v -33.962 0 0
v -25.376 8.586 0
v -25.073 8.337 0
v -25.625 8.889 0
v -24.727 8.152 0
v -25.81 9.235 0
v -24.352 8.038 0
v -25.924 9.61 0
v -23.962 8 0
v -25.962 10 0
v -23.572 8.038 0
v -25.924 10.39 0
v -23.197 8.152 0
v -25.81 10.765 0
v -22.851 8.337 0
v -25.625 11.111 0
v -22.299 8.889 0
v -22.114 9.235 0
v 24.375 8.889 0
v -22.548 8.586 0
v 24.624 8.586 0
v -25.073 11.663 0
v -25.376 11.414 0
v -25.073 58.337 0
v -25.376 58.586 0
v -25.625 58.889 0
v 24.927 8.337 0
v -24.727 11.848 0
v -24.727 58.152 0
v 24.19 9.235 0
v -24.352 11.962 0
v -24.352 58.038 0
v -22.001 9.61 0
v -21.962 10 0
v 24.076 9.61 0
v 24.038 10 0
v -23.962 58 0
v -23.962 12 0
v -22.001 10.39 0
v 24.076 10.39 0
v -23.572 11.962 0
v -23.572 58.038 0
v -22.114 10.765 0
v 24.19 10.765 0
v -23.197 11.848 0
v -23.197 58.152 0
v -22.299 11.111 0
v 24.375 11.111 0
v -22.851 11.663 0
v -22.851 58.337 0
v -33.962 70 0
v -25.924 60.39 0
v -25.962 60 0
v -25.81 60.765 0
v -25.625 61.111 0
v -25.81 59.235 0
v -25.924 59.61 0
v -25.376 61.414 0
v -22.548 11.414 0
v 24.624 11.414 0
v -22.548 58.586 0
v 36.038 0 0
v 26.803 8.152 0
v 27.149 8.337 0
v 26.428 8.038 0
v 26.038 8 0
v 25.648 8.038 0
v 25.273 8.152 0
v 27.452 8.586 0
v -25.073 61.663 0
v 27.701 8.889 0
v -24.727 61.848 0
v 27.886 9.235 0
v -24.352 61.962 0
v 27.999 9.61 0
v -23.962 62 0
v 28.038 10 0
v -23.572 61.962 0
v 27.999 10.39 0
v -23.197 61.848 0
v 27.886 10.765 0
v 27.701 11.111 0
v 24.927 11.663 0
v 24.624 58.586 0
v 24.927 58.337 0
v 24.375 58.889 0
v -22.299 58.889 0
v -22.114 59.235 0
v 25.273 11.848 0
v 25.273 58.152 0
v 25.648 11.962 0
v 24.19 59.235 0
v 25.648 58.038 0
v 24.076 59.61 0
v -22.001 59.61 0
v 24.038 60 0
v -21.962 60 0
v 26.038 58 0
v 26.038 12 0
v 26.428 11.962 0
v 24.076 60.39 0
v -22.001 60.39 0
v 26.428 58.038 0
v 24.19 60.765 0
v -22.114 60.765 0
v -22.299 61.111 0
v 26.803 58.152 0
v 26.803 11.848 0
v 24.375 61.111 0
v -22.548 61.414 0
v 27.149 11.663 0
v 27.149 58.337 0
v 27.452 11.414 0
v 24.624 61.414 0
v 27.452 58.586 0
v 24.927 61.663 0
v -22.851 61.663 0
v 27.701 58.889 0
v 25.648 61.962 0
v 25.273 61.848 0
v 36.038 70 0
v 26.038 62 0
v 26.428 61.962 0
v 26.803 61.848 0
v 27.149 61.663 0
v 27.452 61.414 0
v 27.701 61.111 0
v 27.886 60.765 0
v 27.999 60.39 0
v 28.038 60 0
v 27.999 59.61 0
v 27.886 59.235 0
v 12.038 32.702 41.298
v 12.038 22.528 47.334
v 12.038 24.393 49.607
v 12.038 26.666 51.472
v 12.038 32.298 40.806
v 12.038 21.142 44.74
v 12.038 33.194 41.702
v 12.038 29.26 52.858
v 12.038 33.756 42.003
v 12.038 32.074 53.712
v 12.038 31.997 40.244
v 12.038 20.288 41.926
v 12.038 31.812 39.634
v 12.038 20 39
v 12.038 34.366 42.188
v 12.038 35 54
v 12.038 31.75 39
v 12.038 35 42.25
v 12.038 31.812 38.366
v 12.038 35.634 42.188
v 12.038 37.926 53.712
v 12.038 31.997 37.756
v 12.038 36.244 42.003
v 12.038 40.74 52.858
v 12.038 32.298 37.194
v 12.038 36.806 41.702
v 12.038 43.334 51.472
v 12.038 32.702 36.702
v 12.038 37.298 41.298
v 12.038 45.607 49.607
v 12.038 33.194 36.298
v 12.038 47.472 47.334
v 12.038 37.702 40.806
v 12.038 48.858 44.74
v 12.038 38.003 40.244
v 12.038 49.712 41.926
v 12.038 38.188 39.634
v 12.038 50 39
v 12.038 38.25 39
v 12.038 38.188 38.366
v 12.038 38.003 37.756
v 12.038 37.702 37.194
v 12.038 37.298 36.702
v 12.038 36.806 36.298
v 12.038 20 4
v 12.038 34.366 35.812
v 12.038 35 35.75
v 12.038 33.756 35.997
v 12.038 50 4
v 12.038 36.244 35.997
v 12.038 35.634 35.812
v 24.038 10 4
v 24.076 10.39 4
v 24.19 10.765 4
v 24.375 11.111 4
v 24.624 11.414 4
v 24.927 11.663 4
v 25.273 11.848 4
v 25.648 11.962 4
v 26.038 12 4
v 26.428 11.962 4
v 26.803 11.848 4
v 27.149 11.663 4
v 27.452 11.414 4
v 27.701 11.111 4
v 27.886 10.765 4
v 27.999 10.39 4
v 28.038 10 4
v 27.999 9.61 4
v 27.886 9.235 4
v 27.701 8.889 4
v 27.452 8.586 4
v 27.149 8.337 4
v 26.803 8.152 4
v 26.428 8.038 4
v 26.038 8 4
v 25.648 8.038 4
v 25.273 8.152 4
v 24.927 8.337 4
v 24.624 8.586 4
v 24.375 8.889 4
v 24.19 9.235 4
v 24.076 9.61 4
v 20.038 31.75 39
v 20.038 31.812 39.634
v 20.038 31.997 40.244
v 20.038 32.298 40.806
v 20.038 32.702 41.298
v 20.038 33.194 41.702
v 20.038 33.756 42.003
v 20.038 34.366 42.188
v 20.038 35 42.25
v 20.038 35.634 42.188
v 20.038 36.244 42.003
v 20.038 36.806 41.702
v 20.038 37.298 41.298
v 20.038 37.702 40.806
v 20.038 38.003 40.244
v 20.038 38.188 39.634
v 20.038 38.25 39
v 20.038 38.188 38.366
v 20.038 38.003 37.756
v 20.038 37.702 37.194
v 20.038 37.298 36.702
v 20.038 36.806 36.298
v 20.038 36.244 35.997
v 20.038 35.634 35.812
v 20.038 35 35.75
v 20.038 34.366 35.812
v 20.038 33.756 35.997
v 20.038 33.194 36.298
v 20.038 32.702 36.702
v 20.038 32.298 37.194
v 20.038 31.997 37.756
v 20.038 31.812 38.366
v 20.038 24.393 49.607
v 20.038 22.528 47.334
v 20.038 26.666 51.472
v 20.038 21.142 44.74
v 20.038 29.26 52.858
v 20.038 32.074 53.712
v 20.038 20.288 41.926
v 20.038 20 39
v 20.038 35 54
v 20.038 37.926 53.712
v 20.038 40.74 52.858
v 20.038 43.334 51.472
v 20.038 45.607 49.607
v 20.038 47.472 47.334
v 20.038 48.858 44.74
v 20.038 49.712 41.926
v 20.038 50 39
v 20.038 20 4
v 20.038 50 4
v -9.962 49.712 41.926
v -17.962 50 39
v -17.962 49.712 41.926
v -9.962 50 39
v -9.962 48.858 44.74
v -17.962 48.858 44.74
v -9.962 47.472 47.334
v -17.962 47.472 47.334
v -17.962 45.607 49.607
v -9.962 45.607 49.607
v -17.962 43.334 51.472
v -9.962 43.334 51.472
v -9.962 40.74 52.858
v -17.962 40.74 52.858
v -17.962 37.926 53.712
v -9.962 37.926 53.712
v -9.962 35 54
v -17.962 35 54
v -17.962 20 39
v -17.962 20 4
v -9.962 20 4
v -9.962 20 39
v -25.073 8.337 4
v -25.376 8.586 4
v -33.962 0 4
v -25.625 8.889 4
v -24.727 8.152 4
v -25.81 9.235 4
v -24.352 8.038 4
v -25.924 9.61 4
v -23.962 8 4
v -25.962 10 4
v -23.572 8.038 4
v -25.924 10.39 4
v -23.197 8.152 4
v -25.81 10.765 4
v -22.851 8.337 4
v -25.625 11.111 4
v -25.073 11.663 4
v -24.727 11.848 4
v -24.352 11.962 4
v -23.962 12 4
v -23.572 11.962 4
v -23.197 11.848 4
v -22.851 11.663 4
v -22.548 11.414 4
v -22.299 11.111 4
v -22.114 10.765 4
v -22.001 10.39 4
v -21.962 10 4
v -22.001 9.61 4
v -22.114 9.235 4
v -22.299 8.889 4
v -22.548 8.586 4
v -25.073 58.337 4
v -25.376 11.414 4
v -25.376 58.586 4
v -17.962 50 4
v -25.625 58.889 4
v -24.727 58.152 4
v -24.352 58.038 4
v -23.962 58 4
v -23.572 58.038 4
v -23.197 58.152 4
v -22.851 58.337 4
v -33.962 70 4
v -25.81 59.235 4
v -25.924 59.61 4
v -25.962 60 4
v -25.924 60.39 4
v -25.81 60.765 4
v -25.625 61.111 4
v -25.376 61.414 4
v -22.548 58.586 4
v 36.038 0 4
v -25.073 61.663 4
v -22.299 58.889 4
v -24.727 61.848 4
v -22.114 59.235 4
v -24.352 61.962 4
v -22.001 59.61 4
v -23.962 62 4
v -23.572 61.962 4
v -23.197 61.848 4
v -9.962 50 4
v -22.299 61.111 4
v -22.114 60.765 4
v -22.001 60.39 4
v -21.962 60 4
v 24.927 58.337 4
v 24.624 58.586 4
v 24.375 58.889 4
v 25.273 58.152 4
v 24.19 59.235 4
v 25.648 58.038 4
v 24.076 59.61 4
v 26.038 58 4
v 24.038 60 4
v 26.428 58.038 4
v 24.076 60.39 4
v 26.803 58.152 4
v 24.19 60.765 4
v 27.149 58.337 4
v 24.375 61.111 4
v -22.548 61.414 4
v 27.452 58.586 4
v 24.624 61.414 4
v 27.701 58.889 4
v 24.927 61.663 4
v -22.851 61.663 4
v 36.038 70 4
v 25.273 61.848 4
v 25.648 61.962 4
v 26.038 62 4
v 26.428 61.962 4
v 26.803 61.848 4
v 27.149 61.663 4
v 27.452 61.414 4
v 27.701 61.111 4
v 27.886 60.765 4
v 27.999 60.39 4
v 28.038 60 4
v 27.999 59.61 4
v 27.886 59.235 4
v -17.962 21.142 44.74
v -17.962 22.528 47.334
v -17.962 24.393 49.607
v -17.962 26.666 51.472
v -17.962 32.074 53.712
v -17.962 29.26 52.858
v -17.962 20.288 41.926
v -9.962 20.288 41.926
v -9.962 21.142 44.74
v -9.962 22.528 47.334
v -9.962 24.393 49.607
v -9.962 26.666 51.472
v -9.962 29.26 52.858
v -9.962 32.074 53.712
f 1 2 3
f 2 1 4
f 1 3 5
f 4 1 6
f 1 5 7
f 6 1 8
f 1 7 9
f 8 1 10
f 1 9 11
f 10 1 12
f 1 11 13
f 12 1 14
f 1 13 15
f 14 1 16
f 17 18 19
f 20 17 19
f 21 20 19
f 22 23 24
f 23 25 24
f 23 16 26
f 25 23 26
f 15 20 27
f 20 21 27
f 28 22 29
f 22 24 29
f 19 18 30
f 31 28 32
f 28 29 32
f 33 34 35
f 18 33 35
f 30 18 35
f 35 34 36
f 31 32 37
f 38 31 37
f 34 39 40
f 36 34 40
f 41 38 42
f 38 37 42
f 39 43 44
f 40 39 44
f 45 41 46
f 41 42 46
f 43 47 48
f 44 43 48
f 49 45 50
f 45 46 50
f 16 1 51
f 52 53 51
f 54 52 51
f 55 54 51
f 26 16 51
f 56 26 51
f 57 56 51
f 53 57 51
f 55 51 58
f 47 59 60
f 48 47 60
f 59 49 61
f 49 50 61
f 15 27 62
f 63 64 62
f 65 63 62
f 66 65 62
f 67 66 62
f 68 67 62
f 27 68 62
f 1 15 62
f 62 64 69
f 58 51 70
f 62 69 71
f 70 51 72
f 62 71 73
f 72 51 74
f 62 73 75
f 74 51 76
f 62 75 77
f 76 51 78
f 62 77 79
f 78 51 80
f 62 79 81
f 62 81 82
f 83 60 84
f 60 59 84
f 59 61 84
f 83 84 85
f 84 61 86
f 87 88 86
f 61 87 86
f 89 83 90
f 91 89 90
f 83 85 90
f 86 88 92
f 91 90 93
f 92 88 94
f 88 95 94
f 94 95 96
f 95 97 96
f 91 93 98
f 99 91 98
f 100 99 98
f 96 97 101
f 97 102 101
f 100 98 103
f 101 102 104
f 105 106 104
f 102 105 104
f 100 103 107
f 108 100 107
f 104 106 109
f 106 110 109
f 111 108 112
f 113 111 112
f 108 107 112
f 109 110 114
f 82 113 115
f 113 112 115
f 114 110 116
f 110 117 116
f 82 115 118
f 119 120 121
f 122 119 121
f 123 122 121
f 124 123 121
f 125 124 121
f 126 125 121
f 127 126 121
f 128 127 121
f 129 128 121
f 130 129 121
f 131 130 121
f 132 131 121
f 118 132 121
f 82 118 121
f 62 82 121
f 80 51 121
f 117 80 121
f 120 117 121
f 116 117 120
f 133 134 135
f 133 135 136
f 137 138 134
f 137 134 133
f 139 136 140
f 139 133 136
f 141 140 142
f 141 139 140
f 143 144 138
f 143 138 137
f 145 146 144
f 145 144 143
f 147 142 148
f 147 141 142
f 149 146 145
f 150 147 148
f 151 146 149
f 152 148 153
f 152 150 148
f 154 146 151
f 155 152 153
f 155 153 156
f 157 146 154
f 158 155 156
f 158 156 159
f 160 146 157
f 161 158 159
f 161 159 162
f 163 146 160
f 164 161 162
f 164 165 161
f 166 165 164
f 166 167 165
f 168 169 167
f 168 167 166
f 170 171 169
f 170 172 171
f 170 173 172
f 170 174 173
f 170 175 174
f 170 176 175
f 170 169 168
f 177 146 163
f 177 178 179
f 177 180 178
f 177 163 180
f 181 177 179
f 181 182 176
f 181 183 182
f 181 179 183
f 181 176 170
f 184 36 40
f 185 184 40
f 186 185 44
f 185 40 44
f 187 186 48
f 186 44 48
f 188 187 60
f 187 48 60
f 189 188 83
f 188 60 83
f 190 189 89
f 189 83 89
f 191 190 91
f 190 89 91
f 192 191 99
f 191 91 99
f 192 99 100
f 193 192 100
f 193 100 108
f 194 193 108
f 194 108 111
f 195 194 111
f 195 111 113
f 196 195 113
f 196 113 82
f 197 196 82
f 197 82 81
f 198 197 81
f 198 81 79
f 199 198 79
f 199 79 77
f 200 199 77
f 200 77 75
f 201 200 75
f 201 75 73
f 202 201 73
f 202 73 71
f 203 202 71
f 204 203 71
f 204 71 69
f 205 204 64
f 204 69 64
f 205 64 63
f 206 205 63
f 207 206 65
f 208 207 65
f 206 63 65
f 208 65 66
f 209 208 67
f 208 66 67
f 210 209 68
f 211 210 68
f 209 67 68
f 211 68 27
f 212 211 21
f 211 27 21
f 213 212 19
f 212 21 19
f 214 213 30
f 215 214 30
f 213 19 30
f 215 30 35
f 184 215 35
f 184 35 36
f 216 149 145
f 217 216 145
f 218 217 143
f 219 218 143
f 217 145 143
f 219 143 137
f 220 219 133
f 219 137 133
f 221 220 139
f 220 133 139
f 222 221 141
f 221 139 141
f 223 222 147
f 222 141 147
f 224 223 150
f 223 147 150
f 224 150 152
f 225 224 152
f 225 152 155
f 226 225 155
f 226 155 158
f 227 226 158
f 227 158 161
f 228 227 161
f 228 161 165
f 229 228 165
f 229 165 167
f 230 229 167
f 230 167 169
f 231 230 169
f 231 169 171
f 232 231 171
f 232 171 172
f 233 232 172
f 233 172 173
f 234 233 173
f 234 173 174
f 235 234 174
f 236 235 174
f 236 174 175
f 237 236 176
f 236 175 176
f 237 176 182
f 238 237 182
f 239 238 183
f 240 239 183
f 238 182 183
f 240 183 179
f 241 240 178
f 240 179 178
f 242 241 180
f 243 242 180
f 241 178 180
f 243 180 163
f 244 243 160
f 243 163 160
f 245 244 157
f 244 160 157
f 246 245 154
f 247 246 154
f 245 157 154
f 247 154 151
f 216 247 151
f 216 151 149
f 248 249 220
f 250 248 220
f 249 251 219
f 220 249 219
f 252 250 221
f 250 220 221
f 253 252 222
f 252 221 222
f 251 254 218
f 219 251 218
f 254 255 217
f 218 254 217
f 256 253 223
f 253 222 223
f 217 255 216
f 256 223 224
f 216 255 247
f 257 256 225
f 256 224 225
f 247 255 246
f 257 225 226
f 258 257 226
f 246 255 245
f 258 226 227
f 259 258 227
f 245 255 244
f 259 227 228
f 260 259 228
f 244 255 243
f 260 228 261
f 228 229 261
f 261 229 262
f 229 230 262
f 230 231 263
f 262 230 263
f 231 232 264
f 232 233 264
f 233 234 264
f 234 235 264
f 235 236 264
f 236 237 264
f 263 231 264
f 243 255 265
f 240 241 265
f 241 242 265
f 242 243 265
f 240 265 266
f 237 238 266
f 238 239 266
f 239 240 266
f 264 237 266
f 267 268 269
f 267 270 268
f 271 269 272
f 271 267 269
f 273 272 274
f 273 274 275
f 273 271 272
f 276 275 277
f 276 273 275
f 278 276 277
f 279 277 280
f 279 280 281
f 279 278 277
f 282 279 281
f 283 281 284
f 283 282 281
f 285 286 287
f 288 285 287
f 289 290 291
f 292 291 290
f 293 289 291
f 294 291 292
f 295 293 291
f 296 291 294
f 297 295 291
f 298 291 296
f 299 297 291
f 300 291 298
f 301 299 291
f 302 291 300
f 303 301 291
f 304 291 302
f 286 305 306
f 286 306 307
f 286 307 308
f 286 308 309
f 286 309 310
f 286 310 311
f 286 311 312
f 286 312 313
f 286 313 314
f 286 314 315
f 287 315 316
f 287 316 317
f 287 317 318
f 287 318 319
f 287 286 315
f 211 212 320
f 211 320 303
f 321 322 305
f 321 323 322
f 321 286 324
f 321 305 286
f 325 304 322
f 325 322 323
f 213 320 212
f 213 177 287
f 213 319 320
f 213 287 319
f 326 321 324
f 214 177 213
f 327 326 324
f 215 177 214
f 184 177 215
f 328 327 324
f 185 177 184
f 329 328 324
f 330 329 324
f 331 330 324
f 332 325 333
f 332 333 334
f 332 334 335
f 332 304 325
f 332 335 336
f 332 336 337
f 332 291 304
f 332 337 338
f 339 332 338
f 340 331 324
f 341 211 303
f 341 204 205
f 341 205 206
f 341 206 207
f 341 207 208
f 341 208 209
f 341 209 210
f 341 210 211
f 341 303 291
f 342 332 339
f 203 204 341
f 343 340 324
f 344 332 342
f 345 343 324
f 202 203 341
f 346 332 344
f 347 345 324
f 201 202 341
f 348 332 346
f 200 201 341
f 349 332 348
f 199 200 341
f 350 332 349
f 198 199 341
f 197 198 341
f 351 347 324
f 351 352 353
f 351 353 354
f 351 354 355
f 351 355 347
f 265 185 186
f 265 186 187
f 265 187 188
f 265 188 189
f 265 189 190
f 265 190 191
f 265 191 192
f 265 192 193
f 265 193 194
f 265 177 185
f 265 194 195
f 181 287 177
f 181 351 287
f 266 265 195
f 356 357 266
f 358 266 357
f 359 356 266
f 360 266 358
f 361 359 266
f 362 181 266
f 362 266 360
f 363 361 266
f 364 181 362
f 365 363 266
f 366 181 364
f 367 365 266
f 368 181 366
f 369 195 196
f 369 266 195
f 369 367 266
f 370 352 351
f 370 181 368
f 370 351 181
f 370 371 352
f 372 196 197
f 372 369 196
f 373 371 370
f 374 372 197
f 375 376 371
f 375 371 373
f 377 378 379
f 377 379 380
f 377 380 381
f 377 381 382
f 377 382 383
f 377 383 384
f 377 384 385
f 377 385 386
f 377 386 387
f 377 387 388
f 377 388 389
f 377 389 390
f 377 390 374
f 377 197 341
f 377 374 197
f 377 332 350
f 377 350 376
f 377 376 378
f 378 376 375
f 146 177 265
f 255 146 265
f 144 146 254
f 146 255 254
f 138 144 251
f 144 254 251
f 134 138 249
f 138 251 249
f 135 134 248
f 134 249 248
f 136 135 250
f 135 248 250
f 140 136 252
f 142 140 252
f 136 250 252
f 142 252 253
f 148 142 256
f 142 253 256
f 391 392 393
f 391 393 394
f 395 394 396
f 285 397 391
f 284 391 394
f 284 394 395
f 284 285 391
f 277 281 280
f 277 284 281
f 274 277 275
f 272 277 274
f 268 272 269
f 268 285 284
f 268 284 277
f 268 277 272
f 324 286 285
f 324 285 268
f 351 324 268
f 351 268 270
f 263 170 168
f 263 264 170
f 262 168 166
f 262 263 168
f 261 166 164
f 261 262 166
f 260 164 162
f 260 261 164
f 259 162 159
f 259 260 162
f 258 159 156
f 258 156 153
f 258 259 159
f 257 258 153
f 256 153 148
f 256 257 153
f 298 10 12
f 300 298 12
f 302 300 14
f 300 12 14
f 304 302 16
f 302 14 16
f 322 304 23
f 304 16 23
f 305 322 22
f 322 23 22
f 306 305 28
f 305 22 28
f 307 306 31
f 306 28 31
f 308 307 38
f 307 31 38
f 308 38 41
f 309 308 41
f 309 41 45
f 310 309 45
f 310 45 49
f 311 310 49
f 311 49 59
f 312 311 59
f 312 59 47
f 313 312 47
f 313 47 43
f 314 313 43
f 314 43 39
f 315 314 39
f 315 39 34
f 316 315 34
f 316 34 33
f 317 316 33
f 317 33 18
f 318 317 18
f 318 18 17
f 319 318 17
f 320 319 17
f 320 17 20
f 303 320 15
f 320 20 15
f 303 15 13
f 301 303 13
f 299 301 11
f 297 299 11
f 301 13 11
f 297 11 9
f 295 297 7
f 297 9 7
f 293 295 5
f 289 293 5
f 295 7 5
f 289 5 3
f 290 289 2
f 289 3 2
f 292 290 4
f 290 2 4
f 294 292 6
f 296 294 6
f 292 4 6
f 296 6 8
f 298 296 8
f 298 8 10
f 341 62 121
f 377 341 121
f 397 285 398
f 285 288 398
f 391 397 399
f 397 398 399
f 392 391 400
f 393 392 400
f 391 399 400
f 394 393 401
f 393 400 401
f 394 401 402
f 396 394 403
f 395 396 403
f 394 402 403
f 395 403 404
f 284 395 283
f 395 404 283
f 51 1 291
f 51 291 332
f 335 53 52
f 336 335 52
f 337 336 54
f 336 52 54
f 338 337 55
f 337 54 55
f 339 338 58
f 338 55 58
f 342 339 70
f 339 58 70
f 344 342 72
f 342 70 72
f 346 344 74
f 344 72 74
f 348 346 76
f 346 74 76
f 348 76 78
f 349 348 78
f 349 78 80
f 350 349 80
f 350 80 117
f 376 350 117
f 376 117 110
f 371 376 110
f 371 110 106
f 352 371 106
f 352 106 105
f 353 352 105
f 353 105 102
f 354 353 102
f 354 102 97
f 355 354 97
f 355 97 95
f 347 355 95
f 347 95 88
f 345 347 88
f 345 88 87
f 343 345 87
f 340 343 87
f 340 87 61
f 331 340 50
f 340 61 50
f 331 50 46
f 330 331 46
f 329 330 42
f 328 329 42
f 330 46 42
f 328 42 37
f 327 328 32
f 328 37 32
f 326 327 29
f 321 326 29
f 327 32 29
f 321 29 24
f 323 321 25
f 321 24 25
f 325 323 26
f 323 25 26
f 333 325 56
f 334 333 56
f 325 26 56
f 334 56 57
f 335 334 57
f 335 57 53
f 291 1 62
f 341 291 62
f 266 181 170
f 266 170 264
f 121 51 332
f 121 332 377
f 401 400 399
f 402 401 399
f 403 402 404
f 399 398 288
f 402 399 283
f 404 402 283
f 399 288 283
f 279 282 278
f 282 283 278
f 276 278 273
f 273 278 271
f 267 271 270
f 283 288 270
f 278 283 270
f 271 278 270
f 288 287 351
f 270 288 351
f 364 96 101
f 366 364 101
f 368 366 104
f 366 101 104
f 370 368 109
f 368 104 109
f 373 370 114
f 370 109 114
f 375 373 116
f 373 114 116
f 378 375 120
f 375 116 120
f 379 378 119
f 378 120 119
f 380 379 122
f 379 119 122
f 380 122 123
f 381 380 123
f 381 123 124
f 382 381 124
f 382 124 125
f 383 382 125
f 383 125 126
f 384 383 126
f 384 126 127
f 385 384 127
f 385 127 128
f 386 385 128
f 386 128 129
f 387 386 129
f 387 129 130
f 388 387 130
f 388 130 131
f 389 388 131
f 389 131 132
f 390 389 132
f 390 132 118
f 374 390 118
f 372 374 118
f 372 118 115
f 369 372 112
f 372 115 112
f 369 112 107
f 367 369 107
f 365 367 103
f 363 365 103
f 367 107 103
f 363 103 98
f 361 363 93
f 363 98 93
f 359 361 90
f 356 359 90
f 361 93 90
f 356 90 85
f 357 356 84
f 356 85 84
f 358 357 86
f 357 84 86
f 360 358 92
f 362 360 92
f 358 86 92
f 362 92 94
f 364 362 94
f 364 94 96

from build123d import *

# Parameters (mm, degrees)
F0_W     = 70
F0_H     = 70
F1_DEPTH = 4
F2_W     = 8
F2_H     = 30
F3_DEPTH = 50
F4_R     = 14.99999
F7_D     = 6.5
F7_DEPTH = 15
F7_TIP   = 1.9527970118
F8_D     = 4
F8_DEPTH = 15
F8_TIP   = 1.2017212381


# Not quite as in the source:
# - a fillet or chamfer is up to 0.001 mm smaller than in the source, because OpenCascade refuses the exact size


with BuildPart() as f1:
    # F0 (on Top) → F1 (new body)
    with BuildSketch(Plane.XY):
        with Locations((1.0378739359, 35)):
            Rectangle(F0_W, F0_H)
    extrude(amount=F1_DEPTH)

    # F2 (on face) → F3 (join)
    with BuildSketch(Plane.XY.offset(4)):
        with Locations((-13.9621260641, 35)):
            Rectangle(F2_W, F2_H)
        with Locations((16.0378739359, 35)):
            Rectangle(F2_W, F2_H)
    extrude(amount=F3_DEPTH)

    # F4 (radius 15 in the source; OpenCascade refuses exactly that, so slightly less here)
    f4_edges = [f1.edges().sort_by_distance(p)[0] for p in [
        (-13.962126, 20, 54),
        (-13.962126, 50, 54),
        (16.037874, 20, 54),
        (16.037874, 50, 54),
    ]]
    fillet(f4_edges, radius=F4_R)

    # F7
    with Locations(Plane.YZ.offset(20.0378739359)):
        with Locations((35, 39)):
            Hole(F7_D / 2, depth=F7_DEPTH)
            with Locations((0, 0, -(F7_DEPTH + F7_TIP / 2))):  # 118° drill point
                Cone(0, F7_D / 2, F7_TIP, mode=Mode.SUBTRACT)

    # F8
    with Locations(Plane.XY.offset(4)):
        with Locations((-23.9621260641, 10), (26.0378739359, 10), (26.0378739359, 60), (-23.9621260641, 60)):
            Hole(F8_D / 2, depth=F8_DEPTH)
            with Locations((0, 0, -(F8_DEPTH + F8_TIP / 2))):  # 118° drill point
                Cone(0, F8_D / 2, F8_TIP, mode=Mode.SUBTRACT)


solid = f1.part
